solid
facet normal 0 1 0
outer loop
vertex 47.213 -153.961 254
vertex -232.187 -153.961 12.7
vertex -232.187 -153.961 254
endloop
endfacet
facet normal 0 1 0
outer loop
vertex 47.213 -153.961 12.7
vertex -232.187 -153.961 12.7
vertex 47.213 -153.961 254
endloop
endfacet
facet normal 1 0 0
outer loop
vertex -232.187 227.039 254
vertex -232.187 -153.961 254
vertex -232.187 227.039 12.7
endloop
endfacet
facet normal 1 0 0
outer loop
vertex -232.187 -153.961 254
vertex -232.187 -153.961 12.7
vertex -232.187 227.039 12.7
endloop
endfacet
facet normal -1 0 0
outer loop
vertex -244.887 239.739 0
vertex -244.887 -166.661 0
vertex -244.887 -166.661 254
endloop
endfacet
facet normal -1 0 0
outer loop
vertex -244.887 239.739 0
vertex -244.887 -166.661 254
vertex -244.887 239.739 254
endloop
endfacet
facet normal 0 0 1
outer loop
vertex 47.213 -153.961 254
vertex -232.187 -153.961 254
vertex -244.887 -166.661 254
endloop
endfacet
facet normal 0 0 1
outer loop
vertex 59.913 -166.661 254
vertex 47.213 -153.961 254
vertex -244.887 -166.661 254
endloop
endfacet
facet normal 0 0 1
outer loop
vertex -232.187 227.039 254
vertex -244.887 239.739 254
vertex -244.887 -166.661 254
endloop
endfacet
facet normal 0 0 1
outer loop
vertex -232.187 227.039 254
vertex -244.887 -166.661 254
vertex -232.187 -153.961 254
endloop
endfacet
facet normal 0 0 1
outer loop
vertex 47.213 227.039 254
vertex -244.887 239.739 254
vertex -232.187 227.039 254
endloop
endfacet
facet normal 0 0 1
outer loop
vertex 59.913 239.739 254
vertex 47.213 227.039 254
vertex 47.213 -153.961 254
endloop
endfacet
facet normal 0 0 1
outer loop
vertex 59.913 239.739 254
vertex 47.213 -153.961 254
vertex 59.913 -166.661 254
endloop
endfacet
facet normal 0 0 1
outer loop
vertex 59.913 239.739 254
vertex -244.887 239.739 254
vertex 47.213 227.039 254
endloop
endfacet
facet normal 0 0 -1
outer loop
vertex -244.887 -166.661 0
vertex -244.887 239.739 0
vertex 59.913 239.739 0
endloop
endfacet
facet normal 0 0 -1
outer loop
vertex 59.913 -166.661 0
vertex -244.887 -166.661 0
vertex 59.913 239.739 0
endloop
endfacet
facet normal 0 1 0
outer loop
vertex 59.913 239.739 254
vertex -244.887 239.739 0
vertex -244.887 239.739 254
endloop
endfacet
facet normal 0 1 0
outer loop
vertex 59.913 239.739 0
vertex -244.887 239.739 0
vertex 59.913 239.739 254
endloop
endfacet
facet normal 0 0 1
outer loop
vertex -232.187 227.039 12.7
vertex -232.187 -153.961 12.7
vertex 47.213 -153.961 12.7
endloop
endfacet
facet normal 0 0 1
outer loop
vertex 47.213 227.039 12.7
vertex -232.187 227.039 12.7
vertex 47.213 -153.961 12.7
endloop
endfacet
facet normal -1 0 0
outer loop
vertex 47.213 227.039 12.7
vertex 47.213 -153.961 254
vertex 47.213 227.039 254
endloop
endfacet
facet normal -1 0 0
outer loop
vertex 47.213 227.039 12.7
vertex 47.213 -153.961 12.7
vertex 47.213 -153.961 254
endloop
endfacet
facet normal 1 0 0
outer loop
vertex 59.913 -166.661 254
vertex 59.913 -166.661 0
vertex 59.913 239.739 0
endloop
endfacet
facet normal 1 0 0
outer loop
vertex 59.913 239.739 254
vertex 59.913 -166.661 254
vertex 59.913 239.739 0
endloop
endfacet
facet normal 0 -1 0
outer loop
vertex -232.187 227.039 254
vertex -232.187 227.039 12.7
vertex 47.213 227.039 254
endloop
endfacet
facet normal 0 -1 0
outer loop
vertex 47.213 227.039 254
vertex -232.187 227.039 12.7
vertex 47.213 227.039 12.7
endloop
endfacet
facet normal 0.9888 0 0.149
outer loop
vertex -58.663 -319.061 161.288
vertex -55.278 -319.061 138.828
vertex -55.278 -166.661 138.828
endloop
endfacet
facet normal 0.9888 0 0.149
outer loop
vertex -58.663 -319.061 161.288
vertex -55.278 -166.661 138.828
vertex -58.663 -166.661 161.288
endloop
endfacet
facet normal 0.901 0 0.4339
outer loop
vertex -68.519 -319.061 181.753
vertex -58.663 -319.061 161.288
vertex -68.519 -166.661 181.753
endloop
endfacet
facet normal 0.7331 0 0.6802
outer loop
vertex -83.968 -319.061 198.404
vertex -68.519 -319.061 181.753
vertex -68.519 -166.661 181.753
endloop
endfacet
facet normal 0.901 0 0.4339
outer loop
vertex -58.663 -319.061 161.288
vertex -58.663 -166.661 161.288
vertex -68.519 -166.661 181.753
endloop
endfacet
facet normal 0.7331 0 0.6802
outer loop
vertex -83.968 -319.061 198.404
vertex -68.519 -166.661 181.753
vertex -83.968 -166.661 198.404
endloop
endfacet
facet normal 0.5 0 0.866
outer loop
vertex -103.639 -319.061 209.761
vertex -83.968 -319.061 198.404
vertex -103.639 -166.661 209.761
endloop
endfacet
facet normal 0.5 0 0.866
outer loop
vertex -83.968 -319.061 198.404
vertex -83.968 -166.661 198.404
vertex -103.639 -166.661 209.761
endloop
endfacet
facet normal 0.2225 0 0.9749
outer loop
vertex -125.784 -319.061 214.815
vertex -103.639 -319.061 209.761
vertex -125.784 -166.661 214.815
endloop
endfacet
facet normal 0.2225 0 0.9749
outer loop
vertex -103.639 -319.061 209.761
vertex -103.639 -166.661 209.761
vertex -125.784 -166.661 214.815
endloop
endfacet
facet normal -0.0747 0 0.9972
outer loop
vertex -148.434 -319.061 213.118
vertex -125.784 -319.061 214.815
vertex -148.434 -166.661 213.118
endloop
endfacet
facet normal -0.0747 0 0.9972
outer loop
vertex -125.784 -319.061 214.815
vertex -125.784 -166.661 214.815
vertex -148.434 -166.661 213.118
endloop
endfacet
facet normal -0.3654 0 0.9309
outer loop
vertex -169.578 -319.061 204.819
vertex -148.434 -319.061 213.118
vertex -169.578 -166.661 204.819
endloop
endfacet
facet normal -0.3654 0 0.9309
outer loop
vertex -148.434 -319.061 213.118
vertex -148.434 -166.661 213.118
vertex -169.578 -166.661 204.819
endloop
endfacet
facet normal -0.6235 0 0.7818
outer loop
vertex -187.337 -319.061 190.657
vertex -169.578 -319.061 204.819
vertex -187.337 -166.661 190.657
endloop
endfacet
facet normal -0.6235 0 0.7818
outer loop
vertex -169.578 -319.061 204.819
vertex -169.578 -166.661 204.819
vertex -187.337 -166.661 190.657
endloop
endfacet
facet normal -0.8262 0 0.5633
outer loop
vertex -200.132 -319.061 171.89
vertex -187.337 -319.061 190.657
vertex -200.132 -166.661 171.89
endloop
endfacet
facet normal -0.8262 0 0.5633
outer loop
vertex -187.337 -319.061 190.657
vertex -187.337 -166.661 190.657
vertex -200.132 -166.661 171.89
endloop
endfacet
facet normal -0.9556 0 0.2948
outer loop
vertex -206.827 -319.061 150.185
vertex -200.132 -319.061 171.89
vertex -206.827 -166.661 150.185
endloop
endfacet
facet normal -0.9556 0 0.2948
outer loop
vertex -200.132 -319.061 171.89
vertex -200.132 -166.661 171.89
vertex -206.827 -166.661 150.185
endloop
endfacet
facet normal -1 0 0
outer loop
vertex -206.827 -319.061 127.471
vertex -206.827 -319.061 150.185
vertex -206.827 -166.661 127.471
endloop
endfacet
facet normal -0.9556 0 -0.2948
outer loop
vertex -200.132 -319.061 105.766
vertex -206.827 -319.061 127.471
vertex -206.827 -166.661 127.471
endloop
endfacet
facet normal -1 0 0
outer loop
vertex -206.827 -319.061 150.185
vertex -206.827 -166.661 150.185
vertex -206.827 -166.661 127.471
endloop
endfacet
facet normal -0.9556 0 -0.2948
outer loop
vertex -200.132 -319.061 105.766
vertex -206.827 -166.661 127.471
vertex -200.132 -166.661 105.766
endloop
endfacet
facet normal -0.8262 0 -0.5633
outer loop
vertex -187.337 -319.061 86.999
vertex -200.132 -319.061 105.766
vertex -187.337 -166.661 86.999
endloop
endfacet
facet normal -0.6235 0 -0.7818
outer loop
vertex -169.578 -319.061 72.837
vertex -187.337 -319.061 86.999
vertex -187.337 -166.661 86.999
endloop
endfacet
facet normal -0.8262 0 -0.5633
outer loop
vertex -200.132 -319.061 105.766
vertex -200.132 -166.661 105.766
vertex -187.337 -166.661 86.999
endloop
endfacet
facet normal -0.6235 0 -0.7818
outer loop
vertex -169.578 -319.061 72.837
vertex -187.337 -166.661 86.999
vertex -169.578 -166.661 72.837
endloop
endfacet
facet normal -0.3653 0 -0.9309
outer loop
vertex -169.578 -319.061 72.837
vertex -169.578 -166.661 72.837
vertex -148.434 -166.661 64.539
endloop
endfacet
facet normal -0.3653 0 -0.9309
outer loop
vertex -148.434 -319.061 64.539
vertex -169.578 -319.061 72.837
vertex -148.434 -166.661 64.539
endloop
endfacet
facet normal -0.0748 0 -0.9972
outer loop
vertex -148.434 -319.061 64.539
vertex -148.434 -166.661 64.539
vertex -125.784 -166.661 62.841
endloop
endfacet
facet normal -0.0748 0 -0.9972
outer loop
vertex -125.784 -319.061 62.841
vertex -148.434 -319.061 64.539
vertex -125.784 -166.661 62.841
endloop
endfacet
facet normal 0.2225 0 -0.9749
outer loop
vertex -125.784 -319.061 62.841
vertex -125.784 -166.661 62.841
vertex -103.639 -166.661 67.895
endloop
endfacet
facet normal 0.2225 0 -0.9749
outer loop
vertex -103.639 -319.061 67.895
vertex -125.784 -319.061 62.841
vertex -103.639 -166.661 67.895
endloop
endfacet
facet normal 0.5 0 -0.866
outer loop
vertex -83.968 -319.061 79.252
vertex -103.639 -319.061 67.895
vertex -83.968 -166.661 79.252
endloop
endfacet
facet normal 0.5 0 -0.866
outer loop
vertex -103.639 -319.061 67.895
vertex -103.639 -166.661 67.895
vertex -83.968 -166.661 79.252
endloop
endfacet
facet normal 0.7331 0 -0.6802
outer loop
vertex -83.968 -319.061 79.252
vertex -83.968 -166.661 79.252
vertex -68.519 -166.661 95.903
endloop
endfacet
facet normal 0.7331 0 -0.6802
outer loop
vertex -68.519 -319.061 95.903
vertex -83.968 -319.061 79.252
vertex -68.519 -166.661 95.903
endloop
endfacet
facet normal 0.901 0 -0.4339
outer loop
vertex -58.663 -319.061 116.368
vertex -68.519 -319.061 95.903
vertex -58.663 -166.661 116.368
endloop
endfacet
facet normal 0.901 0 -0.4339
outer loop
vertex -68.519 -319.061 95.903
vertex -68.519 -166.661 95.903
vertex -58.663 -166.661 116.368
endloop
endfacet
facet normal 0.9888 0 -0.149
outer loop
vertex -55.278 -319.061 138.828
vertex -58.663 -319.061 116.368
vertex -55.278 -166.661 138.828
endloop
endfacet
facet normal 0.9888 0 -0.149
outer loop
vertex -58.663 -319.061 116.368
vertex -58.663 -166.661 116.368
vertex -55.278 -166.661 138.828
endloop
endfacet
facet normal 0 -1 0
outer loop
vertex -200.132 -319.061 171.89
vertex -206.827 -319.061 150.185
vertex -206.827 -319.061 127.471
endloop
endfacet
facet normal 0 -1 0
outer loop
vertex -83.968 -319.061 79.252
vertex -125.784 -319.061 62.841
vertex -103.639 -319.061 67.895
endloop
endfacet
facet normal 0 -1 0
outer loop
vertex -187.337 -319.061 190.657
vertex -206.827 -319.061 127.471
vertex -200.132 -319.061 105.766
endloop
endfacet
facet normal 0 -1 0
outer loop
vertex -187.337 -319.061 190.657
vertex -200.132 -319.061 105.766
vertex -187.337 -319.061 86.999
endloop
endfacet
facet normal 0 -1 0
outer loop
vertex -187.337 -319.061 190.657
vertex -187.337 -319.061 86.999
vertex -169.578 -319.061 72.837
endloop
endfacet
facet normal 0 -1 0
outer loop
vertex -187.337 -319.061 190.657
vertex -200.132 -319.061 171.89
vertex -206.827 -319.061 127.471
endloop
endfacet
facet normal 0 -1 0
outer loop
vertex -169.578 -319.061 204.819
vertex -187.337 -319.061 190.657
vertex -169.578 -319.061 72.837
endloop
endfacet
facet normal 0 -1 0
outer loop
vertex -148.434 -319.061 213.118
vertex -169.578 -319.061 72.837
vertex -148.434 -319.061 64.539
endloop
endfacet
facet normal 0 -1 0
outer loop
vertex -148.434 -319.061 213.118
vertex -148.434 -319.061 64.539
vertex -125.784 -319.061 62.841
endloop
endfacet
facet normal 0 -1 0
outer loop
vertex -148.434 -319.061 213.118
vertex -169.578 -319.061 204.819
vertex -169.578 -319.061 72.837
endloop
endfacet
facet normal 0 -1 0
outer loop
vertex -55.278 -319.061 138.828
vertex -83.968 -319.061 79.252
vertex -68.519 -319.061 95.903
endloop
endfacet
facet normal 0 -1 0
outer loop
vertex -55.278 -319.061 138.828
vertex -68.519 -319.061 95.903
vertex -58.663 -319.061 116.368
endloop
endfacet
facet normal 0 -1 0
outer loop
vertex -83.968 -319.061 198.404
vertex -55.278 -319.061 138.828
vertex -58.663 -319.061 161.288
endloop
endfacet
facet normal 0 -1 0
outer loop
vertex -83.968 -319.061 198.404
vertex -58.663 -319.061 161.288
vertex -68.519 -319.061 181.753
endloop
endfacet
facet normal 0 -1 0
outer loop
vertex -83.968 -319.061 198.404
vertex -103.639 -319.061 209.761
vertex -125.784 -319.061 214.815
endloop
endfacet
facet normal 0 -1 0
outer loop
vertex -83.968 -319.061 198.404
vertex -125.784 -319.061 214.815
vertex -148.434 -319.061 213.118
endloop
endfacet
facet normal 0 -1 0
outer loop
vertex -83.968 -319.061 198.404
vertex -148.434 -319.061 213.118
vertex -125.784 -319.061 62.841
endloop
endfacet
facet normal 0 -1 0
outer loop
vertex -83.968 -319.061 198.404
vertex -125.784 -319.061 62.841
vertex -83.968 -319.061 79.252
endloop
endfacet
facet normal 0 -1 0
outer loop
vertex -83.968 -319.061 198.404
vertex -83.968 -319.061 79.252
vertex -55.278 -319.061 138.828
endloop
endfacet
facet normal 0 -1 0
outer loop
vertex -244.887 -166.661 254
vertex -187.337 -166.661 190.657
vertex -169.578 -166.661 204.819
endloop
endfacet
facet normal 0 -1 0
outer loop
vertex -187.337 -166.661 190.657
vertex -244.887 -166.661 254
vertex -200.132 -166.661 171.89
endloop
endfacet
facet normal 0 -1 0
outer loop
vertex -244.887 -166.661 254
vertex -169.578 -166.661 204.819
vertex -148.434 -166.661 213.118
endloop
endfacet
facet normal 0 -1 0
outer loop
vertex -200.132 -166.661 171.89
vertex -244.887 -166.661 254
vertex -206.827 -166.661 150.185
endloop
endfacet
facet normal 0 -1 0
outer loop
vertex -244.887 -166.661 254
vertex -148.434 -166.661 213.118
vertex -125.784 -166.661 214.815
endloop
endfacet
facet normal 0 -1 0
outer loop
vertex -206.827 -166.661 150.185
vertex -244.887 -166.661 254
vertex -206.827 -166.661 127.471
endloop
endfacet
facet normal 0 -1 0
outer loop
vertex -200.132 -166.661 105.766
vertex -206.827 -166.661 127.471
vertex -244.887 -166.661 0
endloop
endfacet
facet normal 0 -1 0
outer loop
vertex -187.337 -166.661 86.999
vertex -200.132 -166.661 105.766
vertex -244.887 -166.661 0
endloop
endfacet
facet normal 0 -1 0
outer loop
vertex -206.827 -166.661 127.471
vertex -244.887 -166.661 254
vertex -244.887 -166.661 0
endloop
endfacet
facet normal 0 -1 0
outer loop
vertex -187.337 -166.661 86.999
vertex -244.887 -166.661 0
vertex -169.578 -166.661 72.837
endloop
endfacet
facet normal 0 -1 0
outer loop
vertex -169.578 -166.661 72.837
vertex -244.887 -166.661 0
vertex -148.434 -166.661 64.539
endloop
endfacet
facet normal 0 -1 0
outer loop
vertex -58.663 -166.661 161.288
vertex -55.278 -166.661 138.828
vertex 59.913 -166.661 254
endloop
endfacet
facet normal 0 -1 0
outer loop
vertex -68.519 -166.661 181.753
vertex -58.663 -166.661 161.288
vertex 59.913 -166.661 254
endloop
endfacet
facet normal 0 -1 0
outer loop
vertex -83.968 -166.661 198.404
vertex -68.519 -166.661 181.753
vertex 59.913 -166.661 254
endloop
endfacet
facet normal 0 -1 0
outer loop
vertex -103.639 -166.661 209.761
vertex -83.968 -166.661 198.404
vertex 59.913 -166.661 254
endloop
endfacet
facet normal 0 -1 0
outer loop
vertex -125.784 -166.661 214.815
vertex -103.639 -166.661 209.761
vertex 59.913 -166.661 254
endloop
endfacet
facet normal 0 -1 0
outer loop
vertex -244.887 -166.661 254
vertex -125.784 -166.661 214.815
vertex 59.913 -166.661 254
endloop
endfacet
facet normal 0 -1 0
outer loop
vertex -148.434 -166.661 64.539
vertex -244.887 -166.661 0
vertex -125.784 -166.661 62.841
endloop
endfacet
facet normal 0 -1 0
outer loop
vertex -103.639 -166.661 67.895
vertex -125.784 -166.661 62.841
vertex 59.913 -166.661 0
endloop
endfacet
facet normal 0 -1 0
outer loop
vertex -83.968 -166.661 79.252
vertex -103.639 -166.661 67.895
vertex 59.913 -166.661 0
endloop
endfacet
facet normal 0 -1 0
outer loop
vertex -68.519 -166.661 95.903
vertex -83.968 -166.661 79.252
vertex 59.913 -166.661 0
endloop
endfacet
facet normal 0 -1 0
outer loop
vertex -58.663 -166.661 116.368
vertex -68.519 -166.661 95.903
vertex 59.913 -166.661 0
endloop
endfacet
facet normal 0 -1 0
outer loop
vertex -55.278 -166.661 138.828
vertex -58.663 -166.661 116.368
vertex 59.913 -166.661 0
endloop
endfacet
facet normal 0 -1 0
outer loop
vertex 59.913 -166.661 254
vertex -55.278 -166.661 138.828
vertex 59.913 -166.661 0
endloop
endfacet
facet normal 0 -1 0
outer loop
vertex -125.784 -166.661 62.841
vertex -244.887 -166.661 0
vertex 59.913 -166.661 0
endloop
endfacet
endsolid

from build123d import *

# Parameters (mm, degrees)
F0_W     = 304.8
F0_H     = 406.4
F1_DEPTH = 254
F2_T     = -12.7
F3_R     = 76.2
F4_DEPTH = 152.4


with BuildPart() as f1:
    # F0 (on Top) → F1 (new body)
    with BuildSketch(Plane.XY):
        with Locations((-92.487486, 36.538938)):
            Rectangle(F0_W, F0_H)
    extrude(amount=F1_DEPTH)

    # F2
    f2_openings = [f1.faces().sort_by_distance(p)[0] for p in [
        (-92.487486, 36.538938, 254),
    ]]
    offset(amount=F2_T, openings=f2_openings)

    # F3 (on face) → F4 (join)
    with BuildSketch(Plane.XZ.offset(166.661062)):
        with Locations((-131.477997, 138.828054)):
            Circle(F3_R)
    extrude(amount=F4_DEPTH)


solid = f1.part
